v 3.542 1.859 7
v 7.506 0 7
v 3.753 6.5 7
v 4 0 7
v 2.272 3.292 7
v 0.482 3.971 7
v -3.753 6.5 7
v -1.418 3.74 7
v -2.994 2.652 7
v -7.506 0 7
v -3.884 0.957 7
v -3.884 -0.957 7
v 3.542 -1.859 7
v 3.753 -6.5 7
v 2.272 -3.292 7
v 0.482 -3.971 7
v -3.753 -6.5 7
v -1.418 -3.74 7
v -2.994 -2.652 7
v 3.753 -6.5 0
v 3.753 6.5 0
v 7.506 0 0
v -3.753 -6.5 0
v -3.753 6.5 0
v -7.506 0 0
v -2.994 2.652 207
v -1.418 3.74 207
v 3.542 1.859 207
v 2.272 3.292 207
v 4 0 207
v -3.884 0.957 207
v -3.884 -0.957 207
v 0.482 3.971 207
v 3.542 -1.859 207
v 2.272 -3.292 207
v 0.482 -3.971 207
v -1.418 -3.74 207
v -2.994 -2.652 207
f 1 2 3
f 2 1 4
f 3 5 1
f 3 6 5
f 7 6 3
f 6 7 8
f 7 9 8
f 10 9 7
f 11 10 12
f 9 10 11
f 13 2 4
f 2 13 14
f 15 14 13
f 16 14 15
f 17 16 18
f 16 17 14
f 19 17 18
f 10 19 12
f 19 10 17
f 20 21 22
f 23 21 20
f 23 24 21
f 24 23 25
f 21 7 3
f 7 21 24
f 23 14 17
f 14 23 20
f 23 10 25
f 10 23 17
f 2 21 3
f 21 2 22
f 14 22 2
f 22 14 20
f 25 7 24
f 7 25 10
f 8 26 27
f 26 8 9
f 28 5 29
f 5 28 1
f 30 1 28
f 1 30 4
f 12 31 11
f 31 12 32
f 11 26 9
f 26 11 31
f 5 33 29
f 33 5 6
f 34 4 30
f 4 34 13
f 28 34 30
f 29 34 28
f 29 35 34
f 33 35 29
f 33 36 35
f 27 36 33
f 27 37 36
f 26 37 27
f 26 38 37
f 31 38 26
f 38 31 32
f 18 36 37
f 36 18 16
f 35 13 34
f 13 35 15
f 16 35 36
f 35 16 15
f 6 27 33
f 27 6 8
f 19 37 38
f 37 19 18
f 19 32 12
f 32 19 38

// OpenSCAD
//This is my attempt to model a bolt.


//Create a bolt by specifying shaft diameter, shaft length, distance accross head flats, and depth of head
module Bolt(diameter,length,head_size,head_depth)
	{
	echo("********************************************");
	echo("Creating bolt with following dimensions");
	echo("Diameter: ",diameter);
	echo("Shaft length: ",length);
	echo("Head size (between flats): ",head_size);
	echo("Head depth: ",head_depth);
	echo("********************************************");

	//Calculate dimentions of hexagon for head of bolt based on distance
	//between flats

	//google found..
	//side_length= 2a tan (180/n)
	//a  is the length of the apothem (inradius)
	//n  is the number of sides
	//tan  is the tangent function calculated in degrees
   side_length=2*head_size/2* tan(180/6);

	//create hexagonal head from 3 cubes rotated 120 degrees
	translate([-side_length/2,-head_size/2,0]) cube([side_length,head_size,head_depth]);
	rotate([0,0,120]) translate([-side_length/2,-head_size/2,0])cube([side_length,head_size,head_depth]);
	rotate([0,0,240]) translate([-side_length/2,-head_size/2,0])cube([side_length,head_size,head_depth]);
	
	//Add shaft offset by depth of head
	shaft_radius=diameter/2;
	translate([0,0,head_depth]) cylinder(length,shaft_radius,shaft_radius);
	}

module nut(nut_size,head_depth)
{
	side_length=2*nut_size/2* tan(180/6);




	//create hexagonal head from 3 cubes rotated 120 degrees
	translate([-side_length/2,-nut_size/2,-head_depth/2]) cube([side_length,nut_size,head_depth]);
	rotate([0,0,120]) translate([-side_length/2,-nut_size/2,-head_depth/2])cube([side_length,nut_size,head_depth]);
	rotate([0,0,240]) translate([-side_length/2,-nut_size/2,-head_depth/2])cube([side_length,nut_size,head_depth]);
}


//Parameters ***********************************
//diameter of shaft
diameter=8;

//length of shaft
length=50;

//distance between flats of head
head_size=13;

//depth of head
head_depth=4.8;

//**********************************************

//Bolt(diameter,length,head_size,head_depth);

Bolt(8,200,13,7);
